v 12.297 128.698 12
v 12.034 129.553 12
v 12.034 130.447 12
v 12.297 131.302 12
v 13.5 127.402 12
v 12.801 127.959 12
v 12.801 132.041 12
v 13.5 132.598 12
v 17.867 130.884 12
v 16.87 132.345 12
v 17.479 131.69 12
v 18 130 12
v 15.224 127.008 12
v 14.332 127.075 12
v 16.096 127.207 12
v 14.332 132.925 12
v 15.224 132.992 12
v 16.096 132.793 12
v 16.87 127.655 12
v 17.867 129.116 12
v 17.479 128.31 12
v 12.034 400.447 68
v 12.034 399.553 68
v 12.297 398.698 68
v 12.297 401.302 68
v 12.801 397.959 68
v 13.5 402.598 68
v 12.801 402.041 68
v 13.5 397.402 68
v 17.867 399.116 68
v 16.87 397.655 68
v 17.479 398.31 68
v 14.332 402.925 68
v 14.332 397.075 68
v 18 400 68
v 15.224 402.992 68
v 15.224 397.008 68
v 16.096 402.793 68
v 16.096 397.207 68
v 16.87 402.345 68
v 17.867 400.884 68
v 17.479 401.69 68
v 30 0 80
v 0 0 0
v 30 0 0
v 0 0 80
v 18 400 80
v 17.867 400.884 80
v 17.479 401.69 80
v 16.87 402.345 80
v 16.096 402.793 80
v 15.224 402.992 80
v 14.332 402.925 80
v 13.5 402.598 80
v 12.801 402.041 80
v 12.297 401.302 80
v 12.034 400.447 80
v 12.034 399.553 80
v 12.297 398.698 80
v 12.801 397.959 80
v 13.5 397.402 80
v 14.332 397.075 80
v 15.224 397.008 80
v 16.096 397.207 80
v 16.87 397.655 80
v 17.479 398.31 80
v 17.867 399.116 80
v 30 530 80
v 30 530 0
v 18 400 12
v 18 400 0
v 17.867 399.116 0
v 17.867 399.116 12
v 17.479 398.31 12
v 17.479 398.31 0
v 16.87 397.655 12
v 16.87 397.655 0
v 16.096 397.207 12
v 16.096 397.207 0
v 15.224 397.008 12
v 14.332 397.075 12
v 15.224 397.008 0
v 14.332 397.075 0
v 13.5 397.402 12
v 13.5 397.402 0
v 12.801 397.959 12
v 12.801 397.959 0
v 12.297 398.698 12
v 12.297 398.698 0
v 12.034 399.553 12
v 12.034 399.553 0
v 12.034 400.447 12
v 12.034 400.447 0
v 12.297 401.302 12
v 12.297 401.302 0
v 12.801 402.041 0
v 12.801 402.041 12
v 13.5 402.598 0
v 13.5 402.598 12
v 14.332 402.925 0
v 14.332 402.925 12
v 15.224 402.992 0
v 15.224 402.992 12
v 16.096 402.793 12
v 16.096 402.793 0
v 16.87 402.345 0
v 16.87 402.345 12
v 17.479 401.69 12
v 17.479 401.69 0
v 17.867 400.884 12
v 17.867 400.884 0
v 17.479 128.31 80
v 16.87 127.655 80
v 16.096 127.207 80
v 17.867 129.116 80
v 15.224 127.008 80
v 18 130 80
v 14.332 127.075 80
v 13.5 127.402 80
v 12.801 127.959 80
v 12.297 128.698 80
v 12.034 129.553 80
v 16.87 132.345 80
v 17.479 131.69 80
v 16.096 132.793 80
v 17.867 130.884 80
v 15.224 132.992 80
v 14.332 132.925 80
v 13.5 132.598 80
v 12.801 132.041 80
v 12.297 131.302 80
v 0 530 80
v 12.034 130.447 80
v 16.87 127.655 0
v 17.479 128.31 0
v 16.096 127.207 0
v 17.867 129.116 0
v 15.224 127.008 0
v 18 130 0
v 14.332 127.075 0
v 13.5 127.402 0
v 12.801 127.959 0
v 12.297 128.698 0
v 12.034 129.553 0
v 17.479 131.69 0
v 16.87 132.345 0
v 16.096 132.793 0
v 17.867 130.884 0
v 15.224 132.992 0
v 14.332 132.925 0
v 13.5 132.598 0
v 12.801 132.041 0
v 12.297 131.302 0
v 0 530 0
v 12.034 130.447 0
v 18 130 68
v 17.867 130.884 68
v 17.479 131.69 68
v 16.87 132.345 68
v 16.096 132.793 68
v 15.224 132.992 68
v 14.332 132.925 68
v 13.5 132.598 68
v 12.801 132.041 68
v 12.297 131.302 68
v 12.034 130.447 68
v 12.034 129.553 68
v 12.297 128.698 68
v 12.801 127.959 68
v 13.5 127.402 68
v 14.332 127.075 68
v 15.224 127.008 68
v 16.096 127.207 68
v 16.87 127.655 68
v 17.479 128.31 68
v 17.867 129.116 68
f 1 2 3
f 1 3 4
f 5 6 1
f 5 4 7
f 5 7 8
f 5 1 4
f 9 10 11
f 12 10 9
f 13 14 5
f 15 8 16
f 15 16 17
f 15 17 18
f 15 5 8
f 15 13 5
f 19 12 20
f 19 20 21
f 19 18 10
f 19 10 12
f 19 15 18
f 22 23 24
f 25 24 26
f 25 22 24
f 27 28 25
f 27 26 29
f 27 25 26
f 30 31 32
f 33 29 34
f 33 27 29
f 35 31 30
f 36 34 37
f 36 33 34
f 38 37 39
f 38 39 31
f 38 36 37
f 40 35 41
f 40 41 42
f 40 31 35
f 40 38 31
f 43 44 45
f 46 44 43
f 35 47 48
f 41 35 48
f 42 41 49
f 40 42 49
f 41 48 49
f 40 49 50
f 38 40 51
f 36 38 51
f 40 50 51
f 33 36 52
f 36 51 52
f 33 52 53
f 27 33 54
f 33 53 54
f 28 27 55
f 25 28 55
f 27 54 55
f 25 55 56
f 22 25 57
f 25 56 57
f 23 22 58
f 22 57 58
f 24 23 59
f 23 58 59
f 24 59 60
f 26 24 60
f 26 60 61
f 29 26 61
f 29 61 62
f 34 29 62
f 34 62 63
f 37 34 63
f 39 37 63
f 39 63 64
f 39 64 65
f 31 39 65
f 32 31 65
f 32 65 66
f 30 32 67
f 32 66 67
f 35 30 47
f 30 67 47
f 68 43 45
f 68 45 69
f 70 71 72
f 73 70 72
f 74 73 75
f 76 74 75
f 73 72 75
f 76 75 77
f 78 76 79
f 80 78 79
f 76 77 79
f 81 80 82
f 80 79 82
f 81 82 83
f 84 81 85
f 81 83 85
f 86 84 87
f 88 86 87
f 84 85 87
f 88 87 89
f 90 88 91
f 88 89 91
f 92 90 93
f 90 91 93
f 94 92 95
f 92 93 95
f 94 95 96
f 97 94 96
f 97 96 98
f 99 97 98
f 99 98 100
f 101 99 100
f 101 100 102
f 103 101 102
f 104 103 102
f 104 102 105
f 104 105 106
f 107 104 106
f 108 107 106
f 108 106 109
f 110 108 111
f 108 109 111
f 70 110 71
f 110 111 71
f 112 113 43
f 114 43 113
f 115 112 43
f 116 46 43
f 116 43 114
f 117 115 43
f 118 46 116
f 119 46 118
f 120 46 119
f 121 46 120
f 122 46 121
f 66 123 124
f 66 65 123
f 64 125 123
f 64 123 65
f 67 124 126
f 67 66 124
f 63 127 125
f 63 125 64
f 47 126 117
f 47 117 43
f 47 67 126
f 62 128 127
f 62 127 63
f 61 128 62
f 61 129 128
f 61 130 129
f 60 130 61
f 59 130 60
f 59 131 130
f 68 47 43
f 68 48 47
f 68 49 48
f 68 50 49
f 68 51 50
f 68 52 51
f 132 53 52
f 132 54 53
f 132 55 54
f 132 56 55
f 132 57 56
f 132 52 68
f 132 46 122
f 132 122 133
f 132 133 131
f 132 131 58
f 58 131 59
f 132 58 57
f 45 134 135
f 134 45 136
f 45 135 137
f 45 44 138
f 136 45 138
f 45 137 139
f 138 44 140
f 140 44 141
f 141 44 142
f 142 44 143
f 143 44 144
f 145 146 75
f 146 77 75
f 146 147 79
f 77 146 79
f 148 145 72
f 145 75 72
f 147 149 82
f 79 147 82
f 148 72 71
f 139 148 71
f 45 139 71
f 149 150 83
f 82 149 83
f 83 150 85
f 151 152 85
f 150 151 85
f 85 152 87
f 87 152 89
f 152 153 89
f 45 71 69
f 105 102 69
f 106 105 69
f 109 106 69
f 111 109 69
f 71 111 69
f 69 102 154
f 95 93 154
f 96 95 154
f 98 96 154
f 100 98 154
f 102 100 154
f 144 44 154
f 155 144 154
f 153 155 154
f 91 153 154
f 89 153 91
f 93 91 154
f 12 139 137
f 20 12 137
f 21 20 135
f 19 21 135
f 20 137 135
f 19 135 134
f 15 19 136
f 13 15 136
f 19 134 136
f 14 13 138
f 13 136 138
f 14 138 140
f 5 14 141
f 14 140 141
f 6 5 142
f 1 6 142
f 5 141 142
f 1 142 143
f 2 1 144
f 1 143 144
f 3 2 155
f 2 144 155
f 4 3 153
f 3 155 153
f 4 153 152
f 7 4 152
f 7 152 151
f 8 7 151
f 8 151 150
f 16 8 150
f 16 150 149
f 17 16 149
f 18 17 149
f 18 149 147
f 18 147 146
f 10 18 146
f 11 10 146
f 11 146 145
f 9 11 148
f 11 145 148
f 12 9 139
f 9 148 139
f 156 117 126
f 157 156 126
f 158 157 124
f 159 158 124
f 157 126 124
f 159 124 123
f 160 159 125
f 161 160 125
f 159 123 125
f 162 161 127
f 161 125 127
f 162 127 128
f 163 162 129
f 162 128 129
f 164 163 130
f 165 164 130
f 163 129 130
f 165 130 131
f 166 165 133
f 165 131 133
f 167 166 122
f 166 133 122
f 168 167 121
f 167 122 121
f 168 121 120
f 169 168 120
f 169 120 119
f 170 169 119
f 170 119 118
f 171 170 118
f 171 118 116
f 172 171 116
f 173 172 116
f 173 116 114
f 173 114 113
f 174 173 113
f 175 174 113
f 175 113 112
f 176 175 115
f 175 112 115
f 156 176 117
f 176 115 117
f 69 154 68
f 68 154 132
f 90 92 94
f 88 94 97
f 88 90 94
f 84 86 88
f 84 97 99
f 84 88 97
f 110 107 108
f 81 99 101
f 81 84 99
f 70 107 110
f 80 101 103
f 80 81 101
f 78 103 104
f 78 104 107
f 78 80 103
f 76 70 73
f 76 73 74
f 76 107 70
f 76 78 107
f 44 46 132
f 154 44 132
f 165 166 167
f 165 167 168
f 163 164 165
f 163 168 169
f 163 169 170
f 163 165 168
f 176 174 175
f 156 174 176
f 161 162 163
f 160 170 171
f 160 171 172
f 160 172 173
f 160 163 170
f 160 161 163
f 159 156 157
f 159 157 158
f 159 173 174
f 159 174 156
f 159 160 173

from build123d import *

# Parameters (mm, degrees)
F0_W     = 530
F0_H     = 80
F1_DEPTH = 30
F2_R     = 3
F3_DEPTH = 12
F4_R     = 3
F5_DEPTH = 12
F6_R     = 3
F7_DEPTH = 12
F8_R     = 3
F9_DEPTH = 12


with BuildPart() as f1:
    # F0 (on Right) → F1 (new body)
    with BuildSketch(Plane.YZ):
        with Locations((265, 40)):
            Rectangle(F0_W, F0_H)
    extrude(amount=F1_DEPTH)

    # F2 (on face) → F3 (cut)
    with BuildSketch(Plane(origin=(0, 0, 0), x_dir=(1, 0, 0), z_dir=(0, 0, -1))):
        with Locations((15, -130)):
            Circle(F2_R)
    extrude(amount=-F3_DEPTH, mode=Mode.SUBTRACT)

    # F4 (on face) → F5 (cut)
    with BuildSketch(Plane.XY.offset(80)):
        with Locations((15, 130)):
            Circle(F4_R)
    extrude(amount=-F5_DEPTH, mode=Mode.SUBTRACT)

    # F6 (on face) → F7 (cut)
    with BuildSketch(Plane(origin=(0, 0, 0), x_dir=(1, 0, 0), z_dir=(0, 0, -1))):
        with Locations((15, -400)):
            Circle(F6_R)
    extrude(amount=-F7_DEPTH, mode=Mode.SUBTRACT)

    # F8 (on face) → F9 (cut)
    with BuildSketch(Plane.XY.offset(80)):
        with Locations((15, 400)):
            Circle(F8_R)
    extrude(amount=-F9_DEPTH, mode=Mode.SUBTRACT)


solid = f1.part
